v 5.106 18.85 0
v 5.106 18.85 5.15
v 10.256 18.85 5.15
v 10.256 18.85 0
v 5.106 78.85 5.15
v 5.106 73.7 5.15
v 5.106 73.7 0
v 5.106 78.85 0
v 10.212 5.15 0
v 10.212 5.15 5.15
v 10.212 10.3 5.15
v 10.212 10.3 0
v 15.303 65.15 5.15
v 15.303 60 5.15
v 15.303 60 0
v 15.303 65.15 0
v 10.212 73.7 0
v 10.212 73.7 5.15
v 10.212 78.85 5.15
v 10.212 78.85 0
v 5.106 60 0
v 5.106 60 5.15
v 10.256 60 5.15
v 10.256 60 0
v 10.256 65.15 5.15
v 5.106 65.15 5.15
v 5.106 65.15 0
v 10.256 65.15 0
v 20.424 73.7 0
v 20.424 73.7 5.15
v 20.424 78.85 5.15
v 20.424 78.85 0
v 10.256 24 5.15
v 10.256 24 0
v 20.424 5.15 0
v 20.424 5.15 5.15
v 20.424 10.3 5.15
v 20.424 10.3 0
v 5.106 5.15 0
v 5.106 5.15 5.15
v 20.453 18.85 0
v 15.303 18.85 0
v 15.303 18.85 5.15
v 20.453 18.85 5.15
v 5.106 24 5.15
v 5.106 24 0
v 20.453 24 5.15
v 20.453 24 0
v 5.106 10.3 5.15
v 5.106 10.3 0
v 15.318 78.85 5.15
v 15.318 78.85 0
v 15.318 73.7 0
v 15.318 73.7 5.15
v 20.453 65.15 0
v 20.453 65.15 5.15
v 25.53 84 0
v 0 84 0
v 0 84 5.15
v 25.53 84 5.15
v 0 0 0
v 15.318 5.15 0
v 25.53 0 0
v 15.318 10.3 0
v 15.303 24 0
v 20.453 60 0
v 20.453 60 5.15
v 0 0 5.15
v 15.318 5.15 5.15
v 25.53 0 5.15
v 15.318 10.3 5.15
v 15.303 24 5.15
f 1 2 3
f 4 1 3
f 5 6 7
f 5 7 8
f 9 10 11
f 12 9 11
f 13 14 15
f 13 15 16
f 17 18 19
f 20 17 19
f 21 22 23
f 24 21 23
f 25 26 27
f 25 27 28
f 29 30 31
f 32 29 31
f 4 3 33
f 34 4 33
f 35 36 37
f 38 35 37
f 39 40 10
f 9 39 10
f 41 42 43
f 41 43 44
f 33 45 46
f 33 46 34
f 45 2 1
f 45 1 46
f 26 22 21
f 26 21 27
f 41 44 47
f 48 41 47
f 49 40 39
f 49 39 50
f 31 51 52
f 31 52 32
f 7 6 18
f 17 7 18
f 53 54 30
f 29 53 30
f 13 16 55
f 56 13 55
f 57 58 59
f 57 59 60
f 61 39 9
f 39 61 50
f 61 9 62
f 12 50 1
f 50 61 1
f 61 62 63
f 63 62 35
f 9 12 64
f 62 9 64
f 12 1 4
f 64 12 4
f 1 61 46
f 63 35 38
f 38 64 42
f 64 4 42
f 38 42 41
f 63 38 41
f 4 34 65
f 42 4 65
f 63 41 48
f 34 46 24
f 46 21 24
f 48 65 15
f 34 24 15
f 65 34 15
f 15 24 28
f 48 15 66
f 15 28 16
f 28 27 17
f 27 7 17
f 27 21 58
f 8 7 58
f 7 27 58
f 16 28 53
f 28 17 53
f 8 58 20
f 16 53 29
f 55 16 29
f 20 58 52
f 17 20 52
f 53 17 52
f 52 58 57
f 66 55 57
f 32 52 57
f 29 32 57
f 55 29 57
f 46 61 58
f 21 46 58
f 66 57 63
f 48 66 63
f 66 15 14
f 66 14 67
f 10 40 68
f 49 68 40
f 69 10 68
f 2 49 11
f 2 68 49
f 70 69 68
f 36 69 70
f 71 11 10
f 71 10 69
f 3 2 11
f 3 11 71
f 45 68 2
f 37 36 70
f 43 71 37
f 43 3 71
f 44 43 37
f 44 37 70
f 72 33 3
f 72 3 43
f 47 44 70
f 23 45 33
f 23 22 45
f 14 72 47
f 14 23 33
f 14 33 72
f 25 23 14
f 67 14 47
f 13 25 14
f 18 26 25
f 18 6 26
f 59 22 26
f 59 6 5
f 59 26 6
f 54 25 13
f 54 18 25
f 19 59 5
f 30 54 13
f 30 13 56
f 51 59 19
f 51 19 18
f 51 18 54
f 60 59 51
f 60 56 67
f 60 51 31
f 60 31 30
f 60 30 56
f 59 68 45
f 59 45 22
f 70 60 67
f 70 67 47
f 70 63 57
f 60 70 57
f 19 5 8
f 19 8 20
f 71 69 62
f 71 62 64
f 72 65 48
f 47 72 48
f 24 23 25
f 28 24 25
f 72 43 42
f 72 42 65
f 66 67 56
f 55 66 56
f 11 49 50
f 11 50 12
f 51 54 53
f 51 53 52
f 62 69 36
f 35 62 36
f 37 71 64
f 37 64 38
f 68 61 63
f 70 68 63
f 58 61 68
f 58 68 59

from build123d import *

# Parameters (mm, degrees)
SKETCH1_W           = 25.53
SKETCH1_H           = 84
BOSS_EXTRUDE1_DEPTH = 5.15
SKETCH2_W           = 5.106
SKETCH2_H           = 5.15
SKETCH2_W_2         = 5.15
CUT_EXTRUDE1_DEPTH  = 6.15


with BuildPart() as part:
    # Sketch1 → Boss-Extrude1 (new body)
    with BuildSketch(Plane.XY):
        with Locations((12.765, 42)):
            Rectangle(SKETCH1_W, SKETCH1_H)
    extrude(amount=BOSS_EXTRUDE1_DEPTH)

    # Sketch2 → Cut-Extrude1 (cut, through all)
    with BuildSketch(Plane.XY.offset(5.15)):
        with Locations((7.659, 76.275)):
            Rectangle(SKETCH2_W, SKETCH2_H)
        with Locations((17.871, 76.275)):
            Rectangle(SKETCH2_W, SKETCH2_H)
        with Locations((17.878171498, 21.425)):
            Rectangle(SKETCH2_W_2, SKETCH2_H)
        with Locations((7.681, 62.575)):
            Rectangle(SKETCH2_W_2, SKETCH2_H)
        with Locations((17.878171498, 62.575)):
            Rectangle(SKETCH2_W_2, SKETCH2_H)
        with Locations((7.681, 21.425)):
            Rectangle(SKETCH2_W_2, SKETCH2_H)
        with Locations((17.871, 7.725)):
            Rectangle(SKETCH2_W, SKETCH2_H)
        with Locations((7.659, 7.725)):
            Rectangle(SKETCH2_W, SKETCH2_H)
    extrude(amount=-CUT_EXTRUDE1_DEPTH, mode=Mode.SUBTRACT)


solid = part.part
